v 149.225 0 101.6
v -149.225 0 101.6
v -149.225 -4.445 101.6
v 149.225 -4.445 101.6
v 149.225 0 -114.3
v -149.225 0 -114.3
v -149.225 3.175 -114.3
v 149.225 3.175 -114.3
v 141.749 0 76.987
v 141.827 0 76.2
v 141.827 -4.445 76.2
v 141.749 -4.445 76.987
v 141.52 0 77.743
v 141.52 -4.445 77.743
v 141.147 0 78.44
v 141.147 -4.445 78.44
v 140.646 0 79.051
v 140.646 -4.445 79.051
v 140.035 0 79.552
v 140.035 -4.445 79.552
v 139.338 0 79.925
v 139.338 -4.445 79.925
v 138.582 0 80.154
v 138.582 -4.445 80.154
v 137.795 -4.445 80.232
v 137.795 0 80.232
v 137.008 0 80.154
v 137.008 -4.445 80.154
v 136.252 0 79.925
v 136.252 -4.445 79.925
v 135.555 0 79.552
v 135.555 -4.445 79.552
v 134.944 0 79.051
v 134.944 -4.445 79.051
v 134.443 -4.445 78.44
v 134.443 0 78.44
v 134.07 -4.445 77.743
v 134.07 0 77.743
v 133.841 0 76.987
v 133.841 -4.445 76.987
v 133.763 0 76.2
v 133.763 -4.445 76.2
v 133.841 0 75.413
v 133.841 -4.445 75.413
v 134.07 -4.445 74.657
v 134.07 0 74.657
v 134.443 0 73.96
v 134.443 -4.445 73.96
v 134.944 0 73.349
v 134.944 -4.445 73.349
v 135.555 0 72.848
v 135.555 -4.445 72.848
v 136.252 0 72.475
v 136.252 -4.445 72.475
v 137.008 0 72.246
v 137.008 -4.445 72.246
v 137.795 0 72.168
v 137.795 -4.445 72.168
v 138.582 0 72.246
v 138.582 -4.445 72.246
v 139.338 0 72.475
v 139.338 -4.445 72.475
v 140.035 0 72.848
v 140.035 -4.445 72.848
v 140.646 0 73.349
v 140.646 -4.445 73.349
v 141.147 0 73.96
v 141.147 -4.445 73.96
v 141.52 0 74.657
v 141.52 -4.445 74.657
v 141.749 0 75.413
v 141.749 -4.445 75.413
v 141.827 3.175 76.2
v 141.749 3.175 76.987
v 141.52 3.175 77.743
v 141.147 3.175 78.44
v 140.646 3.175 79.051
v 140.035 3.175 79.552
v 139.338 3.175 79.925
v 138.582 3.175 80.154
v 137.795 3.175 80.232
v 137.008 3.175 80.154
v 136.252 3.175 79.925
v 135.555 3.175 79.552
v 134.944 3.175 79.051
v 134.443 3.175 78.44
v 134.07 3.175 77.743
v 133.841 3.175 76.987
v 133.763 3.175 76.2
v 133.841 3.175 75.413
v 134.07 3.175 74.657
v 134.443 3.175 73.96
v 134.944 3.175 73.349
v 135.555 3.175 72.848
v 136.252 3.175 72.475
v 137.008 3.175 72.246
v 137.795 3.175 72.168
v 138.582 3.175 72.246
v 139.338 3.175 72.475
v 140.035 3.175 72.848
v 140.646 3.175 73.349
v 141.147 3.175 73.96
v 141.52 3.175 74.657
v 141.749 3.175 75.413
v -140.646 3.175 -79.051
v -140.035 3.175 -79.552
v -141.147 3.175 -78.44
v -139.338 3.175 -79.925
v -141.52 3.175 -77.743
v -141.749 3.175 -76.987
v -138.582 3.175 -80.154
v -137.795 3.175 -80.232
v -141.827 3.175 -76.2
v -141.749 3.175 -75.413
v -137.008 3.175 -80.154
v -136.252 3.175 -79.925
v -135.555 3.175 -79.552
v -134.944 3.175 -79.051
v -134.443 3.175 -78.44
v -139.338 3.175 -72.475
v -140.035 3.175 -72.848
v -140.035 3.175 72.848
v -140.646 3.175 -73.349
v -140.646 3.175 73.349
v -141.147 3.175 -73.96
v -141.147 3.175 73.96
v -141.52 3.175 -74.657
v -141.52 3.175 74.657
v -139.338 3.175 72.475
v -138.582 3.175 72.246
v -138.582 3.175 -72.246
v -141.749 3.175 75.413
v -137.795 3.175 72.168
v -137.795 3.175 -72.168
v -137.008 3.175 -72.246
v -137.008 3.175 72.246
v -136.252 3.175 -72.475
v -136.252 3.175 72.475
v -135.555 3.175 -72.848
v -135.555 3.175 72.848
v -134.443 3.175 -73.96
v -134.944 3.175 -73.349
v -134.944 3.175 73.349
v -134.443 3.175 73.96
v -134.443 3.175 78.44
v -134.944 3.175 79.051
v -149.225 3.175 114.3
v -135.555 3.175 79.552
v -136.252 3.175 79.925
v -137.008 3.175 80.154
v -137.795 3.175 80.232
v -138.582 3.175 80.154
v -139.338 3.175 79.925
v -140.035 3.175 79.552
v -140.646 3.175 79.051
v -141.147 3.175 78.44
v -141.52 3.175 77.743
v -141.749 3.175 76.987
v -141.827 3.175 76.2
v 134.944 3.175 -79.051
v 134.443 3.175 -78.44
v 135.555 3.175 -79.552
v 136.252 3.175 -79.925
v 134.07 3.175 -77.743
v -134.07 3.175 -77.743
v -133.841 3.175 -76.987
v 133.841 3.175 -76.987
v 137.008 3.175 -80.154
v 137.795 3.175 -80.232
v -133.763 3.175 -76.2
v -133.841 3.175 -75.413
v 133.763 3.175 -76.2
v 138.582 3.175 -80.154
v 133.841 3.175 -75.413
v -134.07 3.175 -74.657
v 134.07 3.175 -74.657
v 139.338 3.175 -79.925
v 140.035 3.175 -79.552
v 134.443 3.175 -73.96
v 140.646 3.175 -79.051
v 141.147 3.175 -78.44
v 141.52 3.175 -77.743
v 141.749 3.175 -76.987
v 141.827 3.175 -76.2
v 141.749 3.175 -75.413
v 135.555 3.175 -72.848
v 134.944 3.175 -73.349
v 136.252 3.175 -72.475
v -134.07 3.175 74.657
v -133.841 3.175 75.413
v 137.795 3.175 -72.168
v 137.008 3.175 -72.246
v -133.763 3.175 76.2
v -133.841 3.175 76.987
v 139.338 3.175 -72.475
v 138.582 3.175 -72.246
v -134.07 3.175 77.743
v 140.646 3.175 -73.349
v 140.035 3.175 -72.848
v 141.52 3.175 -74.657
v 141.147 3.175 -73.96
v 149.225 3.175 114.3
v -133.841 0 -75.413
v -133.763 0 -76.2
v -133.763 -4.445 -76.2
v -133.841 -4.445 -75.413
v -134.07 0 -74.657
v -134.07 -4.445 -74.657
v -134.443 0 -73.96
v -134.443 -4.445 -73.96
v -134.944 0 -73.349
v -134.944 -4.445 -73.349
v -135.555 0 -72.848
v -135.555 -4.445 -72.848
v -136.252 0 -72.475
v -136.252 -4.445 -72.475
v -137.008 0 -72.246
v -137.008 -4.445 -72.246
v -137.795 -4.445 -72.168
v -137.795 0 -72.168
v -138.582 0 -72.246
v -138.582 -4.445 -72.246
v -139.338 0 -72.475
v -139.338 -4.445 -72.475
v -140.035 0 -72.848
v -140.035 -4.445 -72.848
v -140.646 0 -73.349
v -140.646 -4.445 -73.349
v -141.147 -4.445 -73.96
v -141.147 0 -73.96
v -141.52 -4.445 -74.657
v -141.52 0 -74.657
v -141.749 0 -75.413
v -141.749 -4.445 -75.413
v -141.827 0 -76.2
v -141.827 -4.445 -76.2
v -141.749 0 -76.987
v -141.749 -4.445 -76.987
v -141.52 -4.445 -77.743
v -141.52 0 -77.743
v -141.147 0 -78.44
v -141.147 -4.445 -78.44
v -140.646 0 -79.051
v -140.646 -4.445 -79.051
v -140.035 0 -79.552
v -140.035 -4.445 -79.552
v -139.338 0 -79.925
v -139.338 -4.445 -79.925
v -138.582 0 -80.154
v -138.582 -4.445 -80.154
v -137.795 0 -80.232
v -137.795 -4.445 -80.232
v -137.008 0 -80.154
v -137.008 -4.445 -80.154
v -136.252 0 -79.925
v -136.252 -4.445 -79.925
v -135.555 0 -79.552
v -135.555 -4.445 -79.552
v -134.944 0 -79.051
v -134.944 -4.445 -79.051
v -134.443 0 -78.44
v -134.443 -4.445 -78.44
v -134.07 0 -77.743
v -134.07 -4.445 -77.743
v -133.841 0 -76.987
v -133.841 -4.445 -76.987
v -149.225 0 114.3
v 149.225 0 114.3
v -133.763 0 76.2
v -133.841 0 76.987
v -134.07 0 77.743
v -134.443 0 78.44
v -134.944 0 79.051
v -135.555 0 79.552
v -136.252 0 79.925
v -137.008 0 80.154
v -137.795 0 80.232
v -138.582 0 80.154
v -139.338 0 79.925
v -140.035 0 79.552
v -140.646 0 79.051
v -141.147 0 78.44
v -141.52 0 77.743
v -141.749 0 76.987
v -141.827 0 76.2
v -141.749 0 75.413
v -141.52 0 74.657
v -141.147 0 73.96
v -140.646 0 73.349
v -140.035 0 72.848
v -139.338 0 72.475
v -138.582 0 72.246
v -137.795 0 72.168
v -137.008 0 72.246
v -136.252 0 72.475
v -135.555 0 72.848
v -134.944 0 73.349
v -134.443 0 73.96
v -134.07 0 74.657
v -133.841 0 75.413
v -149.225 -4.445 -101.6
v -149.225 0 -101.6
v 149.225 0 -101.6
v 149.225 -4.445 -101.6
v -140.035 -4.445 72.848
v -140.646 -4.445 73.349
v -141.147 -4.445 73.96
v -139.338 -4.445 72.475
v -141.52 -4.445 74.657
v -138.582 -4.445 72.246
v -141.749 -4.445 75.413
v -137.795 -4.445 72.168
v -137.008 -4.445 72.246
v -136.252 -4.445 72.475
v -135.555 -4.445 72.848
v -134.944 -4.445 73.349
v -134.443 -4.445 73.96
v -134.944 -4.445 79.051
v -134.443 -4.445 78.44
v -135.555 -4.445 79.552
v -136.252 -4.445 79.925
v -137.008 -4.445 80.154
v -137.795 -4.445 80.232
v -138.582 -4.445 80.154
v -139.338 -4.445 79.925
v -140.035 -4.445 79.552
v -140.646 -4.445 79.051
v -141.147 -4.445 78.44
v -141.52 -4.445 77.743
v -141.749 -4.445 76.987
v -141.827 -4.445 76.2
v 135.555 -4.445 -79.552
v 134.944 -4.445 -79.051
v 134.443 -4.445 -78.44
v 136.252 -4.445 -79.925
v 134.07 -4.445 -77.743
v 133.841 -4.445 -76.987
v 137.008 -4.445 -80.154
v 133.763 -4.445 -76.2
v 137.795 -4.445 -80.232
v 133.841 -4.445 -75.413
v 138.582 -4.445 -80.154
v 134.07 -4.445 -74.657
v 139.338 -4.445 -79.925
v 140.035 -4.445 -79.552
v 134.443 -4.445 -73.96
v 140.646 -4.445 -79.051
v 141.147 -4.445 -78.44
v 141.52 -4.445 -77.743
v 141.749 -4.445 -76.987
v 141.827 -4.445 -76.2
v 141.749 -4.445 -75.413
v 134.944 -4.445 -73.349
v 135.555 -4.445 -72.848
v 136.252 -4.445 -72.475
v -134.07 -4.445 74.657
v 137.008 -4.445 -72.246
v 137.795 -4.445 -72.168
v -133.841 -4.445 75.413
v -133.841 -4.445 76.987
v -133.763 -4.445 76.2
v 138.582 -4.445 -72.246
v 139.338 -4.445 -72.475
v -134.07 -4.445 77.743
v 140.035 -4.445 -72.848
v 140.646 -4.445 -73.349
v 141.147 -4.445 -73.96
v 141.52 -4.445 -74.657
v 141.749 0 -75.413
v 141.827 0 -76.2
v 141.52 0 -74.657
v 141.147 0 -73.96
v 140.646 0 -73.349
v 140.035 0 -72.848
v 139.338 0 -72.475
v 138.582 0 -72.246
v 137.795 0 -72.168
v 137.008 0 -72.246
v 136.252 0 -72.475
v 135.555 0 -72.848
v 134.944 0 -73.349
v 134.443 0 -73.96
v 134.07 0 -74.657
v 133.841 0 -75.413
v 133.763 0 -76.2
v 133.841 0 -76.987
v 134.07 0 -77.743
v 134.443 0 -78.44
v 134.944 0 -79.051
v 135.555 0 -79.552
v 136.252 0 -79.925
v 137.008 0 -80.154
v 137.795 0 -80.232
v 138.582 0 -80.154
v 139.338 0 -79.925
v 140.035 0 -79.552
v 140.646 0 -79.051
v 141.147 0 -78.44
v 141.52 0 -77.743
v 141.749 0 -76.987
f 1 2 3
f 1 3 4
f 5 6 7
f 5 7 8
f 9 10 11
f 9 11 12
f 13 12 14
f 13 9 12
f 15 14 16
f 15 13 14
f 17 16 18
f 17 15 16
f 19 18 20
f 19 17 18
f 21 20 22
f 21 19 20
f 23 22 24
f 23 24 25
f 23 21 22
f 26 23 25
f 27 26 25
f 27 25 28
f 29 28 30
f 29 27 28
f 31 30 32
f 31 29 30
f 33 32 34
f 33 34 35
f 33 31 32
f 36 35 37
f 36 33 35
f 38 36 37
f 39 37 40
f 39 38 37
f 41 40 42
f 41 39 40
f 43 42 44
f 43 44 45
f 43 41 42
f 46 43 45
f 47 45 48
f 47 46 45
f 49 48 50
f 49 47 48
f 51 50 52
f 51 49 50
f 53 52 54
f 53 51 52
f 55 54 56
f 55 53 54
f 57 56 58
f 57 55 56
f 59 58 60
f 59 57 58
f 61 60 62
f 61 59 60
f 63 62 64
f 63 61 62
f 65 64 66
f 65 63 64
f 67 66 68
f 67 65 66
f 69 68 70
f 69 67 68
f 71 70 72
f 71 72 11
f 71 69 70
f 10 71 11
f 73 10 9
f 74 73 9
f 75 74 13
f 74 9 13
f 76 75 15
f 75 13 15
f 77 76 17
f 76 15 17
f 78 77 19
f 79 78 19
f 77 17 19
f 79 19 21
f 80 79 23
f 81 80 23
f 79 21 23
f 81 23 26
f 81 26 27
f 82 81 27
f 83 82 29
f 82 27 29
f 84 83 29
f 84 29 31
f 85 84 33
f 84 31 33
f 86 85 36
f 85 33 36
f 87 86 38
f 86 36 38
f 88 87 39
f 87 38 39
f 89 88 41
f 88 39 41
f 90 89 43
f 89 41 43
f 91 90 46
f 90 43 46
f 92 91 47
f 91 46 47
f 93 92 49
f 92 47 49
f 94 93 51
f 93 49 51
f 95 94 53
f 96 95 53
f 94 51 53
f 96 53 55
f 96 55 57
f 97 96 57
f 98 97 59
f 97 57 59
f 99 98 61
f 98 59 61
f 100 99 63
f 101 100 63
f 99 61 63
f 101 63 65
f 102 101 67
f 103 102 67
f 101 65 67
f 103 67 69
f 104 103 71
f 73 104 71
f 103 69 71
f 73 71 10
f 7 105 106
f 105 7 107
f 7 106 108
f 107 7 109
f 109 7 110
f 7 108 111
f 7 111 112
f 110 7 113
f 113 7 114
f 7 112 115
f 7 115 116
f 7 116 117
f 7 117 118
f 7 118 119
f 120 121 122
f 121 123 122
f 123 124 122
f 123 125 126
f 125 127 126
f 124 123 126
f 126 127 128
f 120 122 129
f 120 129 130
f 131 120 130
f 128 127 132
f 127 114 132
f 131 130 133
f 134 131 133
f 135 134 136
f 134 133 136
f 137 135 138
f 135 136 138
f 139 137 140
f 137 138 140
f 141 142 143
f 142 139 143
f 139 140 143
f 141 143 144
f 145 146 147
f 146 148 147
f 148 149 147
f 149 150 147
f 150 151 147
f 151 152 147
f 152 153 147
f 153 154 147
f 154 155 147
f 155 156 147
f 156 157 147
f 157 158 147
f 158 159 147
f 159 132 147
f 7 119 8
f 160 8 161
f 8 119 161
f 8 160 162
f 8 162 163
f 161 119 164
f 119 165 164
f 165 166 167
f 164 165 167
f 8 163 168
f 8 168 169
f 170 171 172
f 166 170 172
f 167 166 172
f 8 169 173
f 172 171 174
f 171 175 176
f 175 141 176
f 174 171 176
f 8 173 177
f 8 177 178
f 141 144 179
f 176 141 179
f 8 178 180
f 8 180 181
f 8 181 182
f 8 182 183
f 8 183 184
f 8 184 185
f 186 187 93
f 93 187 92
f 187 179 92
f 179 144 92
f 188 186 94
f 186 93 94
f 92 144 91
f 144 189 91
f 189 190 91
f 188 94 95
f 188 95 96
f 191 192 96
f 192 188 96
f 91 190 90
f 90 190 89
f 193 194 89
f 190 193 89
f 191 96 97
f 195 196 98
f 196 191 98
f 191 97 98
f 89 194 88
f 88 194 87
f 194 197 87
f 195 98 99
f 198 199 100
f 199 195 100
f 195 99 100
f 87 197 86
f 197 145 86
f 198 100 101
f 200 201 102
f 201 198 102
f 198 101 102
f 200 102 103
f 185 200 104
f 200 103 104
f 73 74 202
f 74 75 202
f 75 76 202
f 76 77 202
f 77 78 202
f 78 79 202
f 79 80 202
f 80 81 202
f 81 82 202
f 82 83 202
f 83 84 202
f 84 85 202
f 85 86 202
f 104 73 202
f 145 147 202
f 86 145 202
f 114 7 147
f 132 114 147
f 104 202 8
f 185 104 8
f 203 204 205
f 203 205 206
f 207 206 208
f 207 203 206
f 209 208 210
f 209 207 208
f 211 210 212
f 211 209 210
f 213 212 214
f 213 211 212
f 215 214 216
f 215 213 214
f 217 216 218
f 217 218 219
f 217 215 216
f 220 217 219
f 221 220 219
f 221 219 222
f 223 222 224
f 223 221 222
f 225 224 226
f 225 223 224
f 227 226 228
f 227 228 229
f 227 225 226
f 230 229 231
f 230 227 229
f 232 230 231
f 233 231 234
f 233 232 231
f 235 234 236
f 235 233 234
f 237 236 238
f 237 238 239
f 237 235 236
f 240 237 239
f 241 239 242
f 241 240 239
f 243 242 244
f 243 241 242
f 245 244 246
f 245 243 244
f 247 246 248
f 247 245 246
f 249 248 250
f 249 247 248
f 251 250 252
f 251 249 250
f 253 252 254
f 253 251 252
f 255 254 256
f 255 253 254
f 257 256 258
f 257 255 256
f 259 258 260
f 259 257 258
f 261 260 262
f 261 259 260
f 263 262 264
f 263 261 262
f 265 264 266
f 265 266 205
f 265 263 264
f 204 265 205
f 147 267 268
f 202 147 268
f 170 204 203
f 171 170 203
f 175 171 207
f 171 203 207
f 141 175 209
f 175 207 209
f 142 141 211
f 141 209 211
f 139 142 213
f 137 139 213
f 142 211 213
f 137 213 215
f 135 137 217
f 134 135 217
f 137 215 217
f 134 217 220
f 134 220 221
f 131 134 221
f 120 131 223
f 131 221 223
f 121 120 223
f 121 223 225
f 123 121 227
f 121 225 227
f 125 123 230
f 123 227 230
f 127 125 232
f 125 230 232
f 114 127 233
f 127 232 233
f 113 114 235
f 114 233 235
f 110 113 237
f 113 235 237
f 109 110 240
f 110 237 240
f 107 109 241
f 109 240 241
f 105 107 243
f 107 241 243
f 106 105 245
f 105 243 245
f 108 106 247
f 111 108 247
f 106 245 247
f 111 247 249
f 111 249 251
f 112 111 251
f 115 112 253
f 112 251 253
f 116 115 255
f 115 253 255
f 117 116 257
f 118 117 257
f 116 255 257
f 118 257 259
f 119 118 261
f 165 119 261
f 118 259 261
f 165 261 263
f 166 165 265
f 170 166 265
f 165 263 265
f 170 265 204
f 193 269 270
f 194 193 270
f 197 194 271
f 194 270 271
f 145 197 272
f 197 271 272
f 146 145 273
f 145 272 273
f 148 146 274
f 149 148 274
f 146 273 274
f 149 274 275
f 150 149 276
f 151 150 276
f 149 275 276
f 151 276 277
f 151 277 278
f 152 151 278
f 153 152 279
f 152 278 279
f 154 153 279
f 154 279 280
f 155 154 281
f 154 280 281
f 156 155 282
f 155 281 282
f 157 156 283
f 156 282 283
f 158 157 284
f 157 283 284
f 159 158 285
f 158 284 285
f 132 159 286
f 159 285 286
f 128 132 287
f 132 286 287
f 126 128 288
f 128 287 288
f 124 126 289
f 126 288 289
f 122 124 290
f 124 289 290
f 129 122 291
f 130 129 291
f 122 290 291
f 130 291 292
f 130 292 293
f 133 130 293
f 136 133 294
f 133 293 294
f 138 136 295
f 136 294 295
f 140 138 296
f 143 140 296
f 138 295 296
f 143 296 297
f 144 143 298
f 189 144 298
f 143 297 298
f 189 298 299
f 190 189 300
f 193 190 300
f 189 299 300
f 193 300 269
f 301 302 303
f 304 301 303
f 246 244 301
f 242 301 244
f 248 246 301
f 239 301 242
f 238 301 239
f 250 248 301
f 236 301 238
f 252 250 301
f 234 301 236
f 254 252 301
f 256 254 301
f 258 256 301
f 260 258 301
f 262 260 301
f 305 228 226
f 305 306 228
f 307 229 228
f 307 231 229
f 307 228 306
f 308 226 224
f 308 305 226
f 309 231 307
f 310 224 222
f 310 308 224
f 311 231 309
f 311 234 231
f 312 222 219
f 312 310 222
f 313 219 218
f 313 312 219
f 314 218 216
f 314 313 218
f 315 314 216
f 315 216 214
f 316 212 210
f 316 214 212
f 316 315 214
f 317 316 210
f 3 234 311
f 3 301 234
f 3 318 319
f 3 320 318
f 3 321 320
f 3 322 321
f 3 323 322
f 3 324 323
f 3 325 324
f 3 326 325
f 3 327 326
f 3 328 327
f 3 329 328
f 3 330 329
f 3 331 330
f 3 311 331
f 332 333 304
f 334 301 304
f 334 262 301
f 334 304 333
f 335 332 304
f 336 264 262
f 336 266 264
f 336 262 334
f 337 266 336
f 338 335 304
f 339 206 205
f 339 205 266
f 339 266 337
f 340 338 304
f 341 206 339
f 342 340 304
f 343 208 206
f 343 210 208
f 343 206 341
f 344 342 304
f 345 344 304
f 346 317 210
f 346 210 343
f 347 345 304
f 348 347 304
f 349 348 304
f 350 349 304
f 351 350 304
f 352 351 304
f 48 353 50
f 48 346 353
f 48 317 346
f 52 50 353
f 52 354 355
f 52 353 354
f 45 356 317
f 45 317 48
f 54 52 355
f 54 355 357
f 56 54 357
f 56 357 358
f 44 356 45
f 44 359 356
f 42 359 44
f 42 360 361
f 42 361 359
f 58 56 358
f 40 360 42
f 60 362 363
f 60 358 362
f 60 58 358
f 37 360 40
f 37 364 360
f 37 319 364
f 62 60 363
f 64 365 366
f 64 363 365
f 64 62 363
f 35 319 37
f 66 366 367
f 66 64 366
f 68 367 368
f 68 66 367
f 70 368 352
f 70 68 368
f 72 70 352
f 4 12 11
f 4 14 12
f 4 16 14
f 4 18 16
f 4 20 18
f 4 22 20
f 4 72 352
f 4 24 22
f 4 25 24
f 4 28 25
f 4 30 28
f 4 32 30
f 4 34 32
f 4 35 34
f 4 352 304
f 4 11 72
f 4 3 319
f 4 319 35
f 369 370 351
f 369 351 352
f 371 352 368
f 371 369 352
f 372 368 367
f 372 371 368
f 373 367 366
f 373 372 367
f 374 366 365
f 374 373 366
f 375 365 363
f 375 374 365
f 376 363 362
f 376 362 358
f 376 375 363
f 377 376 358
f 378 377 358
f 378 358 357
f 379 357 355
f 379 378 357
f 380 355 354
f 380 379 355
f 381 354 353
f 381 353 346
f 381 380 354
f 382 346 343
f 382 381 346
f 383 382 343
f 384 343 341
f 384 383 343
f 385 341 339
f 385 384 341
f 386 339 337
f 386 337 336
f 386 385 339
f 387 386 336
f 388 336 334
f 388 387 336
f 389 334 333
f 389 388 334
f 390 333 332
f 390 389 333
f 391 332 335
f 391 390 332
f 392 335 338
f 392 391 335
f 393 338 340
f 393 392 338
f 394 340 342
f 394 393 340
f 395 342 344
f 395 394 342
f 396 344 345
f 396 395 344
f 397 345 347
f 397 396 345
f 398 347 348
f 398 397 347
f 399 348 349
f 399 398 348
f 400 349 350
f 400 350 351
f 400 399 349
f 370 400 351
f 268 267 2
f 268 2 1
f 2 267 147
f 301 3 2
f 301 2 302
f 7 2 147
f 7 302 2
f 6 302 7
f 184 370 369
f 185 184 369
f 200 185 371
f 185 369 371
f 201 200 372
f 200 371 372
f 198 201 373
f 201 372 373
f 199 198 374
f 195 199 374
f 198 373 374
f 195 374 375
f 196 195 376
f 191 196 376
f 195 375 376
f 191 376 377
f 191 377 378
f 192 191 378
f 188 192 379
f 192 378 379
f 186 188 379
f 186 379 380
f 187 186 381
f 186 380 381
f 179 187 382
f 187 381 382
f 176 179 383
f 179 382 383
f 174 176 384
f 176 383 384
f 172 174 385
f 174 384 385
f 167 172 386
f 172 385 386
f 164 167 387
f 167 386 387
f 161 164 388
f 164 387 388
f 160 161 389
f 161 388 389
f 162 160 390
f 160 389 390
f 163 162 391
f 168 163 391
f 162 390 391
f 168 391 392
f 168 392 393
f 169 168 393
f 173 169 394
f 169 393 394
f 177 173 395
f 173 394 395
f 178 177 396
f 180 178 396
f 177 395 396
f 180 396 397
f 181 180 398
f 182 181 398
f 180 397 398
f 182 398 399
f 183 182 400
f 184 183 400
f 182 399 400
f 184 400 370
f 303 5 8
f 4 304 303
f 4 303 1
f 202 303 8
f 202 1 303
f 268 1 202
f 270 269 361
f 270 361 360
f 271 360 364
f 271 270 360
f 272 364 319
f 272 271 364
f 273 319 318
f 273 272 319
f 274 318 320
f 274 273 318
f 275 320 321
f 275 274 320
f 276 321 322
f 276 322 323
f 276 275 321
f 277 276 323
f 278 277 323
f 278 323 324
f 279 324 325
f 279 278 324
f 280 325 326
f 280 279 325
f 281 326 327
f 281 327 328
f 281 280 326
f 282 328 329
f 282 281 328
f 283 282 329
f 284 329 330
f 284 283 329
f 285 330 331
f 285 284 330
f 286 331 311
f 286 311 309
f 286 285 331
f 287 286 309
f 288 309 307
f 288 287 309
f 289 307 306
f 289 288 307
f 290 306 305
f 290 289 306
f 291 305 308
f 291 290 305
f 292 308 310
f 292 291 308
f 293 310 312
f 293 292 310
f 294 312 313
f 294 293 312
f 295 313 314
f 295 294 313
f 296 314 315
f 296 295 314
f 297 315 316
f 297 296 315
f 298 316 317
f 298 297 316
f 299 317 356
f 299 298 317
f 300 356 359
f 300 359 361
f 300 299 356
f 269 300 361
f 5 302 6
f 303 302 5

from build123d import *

# Parameters (mm, degrees)
F0_W     = 298.45
F0_H     = 203.2
F0_R     = 4.031729
F1_DEPTH = 4.445
F0_H_2   = 12.7
F2_DEPTH = 3.175


with BuildPart() as f1:
    # F0 (on Front) → F1 (new body)
    with BuildSketch(Plane.XZ):
        Rectangle(F0_W, F0_H)
        with Locations((-137.795, -76.2)):
            Circle(F0_R, mode=Mode.SUBTRACT)
        with Locations((137.795, -76.2)):
            Circle(F0_R, mode=Mode.SUBTRACT)
        with Locations((-137.795, 76.2)):
            Circle(F0_R, mode=Mode.SUBTRACT)
        with Locations((137.795, 76.2)):
            Circle(F0_R, mode=Mode.SUBTRACT)
    extrude(amount=F1_DEPTH)

    # F0 (on Front) → F2 (join)
    with BuildSketch(Plane.XZ):
        with Locations((0, 107.95)):
            Rectangle(F0_W, F0_H_2)
        Rectangle(F0_W, F0_H)
        with Locations((-137.795, -76.2)):
            Circle(F0_R, mode=Mode.SUBTRACT)
        with Locations((137.795, -76.2)):
            Circle(F0_R, mode=Mode.SUBTRACT)
        with Locations((-137.795, 76.2)):
            Circle(F0_R, mode=Mode.SUBTRACT)
        with Locations((137.795, 76.2)):
            Circle(F0_R, mode=Mode.SUBTRACT)
        with Locations((0, -107.95)):
            Rectangle(F0_W, F0_H_2)
    extrude(amount=-F2_DEPTH)


solid = f1.part
